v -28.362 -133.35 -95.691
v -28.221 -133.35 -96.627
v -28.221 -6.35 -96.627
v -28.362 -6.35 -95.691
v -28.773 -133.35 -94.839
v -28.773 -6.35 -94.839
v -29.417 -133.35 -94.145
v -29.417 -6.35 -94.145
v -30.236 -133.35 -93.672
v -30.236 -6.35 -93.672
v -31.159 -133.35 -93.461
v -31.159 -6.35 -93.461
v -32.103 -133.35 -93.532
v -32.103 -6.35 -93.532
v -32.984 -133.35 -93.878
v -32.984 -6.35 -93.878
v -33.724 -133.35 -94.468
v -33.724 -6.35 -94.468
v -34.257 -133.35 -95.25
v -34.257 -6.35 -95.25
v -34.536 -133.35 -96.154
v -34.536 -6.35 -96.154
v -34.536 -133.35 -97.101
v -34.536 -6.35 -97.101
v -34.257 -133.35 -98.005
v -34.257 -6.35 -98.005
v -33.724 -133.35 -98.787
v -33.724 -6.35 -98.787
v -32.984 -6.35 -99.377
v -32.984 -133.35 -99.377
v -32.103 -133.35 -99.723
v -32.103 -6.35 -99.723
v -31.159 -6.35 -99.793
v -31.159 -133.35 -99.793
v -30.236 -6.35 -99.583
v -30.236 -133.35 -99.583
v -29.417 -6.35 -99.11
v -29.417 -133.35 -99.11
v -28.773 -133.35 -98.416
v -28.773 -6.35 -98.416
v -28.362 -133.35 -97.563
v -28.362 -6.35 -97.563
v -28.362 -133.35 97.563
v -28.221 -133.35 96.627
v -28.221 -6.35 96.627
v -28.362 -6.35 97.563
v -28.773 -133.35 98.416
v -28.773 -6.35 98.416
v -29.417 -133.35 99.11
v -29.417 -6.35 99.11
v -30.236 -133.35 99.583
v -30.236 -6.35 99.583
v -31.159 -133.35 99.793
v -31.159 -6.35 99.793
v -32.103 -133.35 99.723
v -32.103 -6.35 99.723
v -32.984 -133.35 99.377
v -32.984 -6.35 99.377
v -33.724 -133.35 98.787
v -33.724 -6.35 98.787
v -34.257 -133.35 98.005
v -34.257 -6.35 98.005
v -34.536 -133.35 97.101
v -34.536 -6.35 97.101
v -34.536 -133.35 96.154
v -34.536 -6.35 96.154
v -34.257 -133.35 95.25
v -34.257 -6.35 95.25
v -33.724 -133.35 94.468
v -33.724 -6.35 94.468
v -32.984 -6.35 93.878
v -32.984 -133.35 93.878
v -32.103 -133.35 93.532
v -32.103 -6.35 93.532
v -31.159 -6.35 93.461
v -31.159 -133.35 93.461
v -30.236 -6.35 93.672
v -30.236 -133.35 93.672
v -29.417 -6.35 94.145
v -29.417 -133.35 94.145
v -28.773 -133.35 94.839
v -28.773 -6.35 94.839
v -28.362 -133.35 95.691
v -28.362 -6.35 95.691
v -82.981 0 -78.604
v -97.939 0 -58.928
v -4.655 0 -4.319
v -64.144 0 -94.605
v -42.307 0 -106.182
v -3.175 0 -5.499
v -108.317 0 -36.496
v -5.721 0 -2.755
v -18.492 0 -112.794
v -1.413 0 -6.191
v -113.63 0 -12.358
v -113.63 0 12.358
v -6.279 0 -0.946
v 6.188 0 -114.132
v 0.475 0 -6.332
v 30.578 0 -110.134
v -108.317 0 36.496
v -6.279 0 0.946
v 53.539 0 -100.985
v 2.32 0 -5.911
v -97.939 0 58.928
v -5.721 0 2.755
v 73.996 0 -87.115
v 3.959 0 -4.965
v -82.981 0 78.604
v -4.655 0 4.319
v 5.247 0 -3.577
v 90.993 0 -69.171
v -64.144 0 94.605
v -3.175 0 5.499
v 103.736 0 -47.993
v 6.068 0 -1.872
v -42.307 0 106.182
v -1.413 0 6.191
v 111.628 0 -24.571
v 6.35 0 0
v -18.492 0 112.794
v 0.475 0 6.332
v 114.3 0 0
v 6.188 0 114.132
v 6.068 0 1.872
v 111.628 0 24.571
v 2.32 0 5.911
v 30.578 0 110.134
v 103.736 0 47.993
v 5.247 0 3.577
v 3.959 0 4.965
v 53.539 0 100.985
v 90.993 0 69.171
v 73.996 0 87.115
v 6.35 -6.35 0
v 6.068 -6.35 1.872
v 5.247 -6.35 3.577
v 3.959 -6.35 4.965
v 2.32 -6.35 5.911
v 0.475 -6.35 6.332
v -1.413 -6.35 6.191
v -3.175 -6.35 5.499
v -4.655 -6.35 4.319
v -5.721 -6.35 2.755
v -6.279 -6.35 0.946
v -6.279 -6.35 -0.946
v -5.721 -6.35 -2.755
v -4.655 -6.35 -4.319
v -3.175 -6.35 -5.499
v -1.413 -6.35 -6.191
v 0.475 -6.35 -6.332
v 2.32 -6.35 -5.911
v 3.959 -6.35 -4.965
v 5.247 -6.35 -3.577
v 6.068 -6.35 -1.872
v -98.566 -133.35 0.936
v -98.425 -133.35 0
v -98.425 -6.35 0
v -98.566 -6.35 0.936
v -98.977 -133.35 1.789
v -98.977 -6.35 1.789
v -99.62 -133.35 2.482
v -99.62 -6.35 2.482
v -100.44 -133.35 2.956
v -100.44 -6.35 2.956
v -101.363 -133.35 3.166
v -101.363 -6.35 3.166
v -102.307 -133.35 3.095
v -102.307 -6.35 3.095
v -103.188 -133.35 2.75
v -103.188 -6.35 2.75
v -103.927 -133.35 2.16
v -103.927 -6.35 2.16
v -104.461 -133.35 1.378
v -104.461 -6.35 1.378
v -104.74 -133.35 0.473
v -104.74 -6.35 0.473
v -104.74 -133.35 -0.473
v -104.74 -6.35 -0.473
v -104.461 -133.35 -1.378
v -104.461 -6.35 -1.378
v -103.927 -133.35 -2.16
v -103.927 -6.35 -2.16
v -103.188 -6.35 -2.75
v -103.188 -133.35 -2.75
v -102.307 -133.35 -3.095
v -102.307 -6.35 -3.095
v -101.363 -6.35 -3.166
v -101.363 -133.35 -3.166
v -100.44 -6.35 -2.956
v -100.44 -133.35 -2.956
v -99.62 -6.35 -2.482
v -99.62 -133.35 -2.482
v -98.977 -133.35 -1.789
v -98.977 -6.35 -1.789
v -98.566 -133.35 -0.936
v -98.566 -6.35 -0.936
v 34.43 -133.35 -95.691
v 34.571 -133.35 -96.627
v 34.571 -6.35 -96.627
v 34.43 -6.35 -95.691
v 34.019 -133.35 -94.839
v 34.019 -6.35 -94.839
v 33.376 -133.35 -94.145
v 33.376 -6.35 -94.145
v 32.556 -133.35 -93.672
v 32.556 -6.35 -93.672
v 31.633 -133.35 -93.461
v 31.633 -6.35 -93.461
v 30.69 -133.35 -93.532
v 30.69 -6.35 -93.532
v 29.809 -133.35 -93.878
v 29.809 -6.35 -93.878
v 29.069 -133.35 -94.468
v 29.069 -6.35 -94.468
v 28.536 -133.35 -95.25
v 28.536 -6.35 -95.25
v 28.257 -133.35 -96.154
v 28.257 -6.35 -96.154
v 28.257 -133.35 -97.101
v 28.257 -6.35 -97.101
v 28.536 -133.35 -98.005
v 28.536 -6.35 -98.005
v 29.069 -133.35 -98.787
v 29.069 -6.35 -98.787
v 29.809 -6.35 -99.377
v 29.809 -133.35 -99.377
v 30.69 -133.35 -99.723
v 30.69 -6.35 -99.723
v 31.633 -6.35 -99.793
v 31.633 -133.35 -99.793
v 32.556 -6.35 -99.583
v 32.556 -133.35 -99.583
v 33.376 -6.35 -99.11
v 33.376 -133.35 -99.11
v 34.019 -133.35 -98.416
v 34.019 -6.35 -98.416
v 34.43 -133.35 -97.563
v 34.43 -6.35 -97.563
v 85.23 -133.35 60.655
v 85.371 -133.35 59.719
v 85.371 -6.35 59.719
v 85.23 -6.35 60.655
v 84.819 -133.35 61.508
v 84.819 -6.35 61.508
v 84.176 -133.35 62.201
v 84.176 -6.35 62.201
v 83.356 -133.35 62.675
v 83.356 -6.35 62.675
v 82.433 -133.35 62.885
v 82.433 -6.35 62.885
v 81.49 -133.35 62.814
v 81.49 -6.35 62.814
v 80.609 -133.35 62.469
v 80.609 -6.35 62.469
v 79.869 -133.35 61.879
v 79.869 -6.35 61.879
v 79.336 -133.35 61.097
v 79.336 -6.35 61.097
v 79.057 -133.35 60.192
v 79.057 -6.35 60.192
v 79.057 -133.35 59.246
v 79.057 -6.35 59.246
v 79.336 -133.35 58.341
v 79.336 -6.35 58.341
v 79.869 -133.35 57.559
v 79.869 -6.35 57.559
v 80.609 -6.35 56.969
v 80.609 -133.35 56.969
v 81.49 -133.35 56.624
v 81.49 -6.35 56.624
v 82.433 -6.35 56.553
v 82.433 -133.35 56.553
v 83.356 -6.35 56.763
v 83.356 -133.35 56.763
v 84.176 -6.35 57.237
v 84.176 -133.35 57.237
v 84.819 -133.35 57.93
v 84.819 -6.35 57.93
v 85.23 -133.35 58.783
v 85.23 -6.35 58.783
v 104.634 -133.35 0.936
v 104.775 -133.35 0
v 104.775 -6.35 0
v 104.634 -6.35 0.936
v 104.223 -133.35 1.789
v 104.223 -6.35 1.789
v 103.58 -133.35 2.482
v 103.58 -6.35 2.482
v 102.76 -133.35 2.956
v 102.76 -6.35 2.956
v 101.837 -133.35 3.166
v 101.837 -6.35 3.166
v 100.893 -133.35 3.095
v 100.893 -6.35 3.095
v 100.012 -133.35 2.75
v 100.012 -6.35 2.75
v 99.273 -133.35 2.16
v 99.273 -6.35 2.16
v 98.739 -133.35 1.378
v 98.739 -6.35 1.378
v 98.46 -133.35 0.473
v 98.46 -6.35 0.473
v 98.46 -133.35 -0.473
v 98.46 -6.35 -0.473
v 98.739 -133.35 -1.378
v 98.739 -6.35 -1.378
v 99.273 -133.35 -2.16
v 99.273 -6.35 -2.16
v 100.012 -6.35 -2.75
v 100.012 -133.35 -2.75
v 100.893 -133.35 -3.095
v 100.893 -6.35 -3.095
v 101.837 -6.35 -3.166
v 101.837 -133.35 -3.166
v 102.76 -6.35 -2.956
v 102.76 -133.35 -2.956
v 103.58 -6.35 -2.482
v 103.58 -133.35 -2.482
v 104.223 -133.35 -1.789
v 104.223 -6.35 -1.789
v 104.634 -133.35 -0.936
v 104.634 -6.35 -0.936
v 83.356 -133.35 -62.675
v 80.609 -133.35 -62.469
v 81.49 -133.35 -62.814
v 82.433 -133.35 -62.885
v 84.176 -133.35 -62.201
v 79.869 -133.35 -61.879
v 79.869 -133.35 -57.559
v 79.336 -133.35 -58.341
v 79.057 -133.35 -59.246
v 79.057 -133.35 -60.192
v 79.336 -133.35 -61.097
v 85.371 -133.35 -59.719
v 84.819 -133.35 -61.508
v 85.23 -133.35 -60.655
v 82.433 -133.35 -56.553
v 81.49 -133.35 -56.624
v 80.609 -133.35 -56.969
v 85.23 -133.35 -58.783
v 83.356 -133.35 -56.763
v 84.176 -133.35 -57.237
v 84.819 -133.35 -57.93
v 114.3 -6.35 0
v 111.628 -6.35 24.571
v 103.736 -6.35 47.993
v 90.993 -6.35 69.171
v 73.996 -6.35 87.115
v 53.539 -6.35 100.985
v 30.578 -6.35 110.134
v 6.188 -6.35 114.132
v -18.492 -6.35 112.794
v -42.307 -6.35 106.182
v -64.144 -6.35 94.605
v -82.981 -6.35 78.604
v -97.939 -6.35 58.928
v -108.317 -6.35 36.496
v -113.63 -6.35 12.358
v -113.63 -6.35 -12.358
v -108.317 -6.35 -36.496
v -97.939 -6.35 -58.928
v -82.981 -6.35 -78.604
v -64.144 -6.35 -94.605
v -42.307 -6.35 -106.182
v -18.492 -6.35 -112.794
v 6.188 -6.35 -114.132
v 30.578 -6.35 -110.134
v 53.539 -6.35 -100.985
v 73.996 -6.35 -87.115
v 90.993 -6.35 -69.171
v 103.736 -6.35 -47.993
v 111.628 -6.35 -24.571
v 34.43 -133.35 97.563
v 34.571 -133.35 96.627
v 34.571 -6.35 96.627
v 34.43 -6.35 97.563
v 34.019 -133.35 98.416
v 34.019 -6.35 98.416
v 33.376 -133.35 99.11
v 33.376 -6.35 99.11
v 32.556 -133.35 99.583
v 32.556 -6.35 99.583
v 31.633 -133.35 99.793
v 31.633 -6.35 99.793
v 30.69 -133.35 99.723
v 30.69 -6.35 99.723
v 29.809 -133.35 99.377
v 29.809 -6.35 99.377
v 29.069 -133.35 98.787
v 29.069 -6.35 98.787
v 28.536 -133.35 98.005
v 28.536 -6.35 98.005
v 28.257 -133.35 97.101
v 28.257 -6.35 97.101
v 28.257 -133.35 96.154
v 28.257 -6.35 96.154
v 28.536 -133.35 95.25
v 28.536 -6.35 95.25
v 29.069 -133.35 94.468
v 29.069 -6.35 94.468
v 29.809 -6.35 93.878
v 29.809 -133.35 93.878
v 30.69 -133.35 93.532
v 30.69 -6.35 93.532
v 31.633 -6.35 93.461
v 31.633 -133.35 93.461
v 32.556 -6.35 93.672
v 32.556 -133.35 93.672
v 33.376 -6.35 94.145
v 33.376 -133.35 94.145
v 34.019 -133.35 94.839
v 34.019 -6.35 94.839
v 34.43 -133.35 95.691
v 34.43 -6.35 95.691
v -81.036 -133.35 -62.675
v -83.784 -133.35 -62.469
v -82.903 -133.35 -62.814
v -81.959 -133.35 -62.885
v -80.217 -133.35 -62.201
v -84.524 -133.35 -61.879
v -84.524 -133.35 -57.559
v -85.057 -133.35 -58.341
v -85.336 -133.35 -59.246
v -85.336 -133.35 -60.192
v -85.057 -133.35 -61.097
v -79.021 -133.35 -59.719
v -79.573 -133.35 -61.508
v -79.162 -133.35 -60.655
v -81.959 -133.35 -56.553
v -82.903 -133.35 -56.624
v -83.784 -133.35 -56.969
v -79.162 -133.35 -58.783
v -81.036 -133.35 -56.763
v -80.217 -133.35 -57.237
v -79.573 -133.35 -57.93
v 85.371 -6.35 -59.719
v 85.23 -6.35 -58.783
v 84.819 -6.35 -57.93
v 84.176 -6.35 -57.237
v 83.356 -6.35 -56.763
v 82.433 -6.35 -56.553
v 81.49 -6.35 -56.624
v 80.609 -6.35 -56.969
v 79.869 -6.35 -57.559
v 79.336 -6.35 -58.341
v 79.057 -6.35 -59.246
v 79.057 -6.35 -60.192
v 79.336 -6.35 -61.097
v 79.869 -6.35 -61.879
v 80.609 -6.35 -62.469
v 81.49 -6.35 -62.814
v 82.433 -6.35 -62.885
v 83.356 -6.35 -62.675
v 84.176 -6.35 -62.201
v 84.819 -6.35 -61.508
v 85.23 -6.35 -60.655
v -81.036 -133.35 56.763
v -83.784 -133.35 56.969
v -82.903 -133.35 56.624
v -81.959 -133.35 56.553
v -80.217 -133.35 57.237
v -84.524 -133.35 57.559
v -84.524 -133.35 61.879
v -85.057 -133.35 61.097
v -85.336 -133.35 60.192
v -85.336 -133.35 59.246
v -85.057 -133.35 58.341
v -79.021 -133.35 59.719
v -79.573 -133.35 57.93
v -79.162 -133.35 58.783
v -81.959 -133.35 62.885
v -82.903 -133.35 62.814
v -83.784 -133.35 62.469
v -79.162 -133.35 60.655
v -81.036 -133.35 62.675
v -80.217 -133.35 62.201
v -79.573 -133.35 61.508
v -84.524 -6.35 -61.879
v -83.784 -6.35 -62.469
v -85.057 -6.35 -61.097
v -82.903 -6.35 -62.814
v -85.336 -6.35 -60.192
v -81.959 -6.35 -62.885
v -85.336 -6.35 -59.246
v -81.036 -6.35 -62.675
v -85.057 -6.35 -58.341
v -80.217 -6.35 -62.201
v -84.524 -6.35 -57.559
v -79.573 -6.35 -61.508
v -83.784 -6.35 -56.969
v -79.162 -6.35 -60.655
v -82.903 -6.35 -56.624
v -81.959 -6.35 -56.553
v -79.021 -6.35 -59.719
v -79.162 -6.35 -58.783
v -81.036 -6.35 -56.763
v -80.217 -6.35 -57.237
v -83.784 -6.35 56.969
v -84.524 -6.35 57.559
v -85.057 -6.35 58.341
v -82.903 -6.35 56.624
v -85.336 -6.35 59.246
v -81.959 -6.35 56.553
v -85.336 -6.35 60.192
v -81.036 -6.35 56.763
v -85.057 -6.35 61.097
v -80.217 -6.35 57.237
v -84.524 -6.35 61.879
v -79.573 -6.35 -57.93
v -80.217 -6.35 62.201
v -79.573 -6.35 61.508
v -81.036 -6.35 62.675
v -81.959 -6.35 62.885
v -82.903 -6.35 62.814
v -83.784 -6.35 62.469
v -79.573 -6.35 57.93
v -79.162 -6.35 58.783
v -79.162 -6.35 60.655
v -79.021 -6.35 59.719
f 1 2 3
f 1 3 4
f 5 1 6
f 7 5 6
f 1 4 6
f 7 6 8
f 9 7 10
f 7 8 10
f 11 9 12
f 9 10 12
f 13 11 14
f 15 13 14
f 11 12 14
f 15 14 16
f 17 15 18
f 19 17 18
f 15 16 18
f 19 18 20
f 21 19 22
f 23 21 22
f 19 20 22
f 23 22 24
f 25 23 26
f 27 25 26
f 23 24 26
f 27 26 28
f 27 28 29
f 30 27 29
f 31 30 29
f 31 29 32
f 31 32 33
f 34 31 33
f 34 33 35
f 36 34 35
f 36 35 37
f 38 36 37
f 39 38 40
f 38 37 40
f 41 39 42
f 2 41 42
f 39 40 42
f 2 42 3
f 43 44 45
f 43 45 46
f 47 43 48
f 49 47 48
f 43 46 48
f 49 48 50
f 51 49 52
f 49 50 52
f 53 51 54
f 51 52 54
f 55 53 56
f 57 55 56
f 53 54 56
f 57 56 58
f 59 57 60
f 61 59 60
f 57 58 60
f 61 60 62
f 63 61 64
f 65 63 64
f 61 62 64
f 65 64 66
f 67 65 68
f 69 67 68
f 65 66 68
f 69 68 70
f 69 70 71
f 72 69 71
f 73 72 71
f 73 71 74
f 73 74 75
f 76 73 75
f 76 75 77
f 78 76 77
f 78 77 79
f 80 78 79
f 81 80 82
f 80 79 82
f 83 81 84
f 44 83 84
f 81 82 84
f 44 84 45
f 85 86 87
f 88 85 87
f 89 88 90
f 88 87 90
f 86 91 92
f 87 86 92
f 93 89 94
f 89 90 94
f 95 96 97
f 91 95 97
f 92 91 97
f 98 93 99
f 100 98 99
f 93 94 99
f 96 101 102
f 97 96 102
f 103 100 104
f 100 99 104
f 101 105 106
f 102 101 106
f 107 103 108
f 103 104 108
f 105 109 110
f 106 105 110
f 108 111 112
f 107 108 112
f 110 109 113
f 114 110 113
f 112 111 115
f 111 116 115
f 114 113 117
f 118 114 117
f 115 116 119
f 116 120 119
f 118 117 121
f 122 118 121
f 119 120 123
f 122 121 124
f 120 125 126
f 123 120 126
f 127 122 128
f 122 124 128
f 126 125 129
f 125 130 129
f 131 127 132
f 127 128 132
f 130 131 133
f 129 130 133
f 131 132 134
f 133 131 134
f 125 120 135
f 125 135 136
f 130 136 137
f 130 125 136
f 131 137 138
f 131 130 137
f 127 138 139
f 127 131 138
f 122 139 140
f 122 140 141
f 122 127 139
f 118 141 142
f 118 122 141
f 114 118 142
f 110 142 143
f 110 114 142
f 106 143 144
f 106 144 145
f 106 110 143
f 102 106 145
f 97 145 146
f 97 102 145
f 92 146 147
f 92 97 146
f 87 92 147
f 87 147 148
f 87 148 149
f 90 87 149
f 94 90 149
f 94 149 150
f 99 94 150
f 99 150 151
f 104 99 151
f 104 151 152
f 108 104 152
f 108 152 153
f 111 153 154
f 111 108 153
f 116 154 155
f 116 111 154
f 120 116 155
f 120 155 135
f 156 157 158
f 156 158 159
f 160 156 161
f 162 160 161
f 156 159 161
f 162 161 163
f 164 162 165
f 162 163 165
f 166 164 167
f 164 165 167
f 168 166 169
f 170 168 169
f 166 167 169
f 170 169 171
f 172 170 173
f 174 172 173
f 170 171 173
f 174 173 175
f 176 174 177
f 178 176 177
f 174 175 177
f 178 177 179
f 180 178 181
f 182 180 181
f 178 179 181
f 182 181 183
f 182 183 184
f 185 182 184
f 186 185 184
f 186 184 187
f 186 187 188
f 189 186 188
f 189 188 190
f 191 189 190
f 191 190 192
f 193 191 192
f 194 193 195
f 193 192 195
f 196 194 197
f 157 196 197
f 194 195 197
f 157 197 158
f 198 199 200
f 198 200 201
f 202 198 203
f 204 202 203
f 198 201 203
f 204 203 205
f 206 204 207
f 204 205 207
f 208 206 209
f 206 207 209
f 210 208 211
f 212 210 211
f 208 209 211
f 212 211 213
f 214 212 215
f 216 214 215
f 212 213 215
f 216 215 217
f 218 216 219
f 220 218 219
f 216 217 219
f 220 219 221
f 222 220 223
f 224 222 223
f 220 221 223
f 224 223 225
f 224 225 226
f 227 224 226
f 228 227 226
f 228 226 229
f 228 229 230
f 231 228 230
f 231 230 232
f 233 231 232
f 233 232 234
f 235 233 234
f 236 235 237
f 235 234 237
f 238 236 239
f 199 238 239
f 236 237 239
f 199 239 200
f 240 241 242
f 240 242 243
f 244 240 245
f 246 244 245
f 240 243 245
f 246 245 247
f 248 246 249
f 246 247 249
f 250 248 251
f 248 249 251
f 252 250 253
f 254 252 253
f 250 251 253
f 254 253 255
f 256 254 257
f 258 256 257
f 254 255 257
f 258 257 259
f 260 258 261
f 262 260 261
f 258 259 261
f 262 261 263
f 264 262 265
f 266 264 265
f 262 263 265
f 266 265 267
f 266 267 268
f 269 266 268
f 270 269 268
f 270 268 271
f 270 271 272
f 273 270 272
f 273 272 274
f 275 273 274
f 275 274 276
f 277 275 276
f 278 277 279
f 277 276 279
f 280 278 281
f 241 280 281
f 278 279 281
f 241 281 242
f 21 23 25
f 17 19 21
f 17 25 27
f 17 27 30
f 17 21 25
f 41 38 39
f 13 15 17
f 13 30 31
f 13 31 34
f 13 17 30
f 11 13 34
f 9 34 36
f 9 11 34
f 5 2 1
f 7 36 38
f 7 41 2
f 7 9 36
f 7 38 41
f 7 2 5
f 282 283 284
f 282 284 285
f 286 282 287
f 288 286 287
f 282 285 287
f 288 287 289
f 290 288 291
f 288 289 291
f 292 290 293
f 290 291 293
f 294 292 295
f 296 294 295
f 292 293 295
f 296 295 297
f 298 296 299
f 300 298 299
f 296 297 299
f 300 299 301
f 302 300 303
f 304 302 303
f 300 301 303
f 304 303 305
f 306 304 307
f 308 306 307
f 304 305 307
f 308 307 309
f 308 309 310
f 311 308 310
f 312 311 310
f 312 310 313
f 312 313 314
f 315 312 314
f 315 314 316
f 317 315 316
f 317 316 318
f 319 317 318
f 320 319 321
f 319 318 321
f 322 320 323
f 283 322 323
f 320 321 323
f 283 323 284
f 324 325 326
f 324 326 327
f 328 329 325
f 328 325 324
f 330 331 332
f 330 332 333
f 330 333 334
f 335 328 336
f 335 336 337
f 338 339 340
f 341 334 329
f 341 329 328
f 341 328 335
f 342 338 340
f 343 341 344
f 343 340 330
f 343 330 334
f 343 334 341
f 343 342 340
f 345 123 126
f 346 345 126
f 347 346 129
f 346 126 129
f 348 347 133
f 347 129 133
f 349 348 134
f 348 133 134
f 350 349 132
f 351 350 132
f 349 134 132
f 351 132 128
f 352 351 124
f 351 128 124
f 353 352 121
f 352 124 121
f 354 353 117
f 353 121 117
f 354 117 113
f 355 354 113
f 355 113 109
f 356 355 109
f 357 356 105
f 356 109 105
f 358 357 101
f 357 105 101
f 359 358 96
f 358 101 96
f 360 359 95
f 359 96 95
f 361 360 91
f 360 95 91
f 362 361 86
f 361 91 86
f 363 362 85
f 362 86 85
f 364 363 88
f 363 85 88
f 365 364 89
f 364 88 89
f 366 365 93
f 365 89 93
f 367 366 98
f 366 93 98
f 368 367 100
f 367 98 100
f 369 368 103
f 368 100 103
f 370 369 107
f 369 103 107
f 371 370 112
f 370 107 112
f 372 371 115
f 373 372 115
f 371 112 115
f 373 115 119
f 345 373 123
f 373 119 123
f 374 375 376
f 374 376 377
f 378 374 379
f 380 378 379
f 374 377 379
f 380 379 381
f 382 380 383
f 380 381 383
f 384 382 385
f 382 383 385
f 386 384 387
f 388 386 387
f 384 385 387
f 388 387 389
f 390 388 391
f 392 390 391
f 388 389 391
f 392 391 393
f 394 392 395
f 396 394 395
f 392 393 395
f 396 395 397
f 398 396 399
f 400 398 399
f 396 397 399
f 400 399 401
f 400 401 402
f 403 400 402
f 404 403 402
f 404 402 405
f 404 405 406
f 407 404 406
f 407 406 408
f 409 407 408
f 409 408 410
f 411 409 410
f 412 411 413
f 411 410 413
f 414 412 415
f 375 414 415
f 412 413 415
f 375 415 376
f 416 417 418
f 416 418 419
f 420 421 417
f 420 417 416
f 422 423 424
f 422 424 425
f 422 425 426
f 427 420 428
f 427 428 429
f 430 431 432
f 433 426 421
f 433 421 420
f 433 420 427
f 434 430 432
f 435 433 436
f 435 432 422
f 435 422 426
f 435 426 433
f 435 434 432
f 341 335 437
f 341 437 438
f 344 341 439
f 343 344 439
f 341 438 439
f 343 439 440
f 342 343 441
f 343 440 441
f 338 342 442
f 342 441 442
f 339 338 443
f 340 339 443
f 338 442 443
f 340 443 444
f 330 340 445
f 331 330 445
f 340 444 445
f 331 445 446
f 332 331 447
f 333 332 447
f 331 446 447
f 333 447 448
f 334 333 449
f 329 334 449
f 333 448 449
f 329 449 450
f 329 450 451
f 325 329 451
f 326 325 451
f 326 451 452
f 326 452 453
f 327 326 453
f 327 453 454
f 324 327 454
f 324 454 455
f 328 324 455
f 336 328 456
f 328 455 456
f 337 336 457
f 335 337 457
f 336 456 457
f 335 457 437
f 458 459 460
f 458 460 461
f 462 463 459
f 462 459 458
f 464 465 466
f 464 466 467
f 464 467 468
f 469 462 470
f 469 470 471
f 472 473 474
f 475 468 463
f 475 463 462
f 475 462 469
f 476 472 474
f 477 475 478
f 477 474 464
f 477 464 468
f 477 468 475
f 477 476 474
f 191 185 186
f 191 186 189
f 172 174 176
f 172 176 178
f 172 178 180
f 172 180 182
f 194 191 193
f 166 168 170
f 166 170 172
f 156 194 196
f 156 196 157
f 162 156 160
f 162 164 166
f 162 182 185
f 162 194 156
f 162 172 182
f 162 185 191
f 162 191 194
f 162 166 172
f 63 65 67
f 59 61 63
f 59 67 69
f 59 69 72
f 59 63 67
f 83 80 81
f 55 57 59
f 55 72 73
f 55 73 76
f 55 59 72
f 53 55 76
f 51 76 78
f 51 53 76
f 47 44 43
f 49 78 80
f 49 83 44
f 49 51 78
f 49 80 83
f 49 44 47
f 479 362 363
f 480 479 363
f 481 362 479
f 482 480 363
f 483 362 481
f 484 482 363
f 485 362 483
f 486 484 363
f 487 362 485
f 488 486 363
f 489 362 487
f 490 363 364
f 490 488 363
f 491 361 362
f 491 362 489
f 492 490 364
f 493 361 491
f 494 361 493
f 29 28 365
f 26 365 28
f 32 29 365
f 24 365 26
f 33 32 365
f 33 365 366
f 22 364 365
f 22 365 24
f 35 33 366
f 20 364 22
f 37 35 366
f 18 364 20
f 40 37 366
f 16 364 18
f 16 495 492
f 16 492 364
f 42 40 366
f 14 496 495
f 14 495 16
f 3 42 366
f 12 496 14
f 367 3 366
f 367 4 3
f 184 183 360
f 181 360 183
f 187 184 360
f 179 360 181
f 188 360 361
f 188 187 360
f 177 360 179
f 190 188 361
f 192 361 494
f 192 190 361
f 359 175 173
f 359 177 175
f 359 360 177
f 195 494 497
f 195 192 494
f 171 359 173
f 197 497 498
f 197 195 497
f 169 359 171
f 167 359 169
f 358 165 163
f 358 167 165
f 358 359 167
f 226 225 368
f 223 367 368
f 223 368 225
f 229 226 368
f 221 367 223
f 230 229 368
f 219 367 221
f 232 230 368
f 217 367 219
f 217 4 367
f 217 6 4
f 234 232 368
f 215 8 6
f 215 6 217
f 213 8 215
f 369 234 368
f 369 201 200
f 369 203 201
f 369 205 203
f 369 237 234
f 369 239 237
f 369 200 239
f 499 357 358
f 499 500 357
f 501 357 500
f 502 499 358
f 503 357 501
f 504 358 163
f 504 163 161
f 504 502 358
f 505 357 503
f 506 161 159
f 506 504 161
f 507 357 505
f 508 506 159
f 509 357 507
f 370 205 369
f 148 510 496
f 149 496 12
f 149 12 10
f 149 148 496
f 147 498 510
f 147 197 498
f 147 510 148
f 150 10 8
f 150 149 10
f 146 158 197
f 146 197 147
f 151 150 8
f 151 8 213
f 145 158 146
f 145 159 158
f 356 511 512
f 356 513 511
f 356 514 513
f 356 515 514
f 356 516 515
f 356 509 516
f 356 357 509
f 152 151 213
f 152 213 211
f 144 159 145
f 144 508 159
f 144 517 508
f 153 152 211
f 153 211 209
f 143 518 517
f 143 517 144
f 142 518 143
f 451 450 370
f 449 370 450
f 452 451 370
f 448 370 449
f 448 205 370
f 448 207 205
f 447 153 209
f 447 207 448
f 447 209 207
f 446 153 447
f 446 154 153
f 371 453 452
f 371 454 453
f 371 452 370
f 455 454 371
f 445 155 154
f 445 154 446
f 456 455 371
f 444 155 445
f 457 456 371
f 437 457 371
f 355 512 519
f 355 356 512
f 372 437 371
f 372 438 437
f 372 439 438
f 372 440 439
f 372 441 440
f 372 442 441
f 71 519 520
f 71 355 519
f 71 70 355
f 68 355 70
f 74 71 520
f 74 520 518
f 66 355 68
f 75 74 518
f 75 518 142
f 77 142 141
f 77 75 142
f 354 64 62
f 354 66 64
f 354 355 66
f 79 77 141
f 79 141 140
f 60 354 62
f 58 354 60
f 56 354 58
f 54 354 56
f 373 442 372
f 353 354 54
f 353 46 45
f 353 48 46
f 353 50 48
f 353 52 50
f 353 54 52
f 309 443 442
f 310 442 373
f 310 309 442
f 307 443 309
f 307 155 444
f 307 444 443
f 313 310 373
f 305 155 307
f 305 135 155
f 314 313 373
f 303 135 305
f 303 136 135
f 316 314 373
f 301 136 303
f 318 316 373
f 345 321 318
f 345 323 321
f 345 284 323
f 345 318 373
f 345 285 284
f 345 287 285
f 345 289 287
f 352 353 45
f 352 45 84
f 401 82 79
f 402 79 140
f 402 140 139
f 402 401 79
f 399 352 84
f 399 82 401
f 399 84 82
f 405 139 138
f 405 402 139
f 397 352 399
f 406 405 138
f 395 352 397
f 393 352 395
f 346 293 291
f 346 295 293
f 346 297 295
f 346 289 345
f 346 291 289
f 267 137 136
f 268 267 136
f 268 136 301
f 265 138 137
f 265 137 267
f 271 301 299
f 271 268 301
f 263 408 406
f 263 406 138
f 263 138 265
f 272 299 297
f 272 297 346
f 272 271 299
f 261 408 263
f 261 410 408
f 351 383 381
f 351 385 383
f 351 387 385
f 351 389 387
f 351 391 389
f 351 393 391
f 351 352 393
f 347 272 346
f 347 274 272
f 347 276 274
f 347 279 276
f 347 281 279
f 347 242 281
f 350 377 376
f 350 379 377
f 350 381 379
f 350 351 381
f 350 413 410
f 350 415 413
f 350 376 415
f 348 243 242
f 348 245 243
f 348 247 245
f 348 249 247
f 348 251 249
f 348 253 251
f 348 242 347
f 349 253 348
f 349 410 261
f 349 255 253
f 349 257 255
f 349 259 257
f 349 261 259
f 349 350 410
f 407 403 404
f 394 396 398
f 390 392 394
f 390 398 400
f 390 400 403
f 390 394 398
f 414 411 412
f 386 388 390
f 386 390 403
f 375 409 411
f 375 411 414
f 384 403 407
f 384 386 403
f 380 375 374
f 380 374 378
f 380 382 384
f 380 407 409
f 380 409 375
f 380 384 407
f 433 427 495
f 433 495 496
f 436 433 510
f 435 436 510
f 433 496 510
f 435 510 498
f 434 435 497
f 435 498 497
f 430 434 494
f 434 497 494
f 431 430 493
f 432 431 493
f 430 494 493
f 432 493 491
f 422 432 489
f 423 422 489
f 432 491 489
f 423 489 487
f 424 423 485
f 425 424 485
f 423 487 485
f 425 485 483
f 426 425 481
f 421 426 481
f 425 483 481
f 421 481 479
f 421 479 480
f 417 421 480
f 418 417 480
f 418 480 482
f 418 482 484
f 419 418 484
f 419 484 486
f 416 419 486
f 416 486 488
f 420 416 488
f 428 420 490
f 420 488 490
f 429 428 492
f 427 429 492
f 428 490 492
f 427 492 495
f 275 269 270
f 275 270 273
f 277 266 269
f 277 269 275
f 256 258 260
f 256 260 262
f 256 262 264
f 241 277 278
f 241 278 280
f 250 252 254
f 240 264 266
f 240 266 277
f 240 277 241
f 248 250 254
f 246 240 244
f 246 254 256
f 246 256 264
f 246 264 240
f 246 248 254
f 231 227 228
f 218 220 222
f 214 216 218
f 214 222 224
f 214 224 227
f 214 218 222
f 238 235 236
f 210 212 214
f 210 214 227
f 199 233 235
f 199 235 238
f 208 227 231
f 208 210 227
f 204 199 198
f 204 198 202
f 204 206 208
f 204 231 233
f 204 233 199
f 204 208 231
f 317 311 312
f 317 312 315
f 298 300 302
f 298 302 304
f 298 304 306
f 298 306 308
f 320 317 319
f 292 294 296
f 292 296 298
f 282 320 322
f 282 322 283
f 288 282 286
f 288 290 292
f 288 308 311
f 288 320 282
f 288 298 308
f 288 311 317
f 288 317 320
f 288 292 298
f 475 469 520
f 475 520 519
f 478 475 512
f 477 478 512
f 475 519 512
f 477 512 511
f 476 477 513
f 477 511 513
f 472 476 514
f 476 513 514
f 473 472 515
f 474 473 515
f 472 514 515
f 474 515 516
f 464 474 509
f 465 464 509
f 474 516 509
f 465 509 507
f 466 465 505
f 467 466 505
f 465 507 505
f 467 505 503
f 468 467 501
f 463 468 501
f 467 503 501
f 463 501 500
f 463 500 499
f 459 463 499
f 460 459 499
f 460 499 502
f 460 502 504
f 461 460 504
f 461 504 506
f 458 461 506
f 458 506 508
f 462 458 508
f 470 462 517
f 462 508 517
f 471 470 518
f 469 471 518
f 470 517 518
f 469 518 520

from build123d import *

# Parameters (mm, degrees)
F0_R     = 114.3
F0_R_2   = 6.35
F1_DEPTH = 6.35
F2_R     = 3.175
F3_DEPTH = 127


with BuildPart() as f1:
    # F0 (on Front) → F1 (new body)
    with BuildSketch(Plane.XZ):
        Circle(F0_R)
        Circle(F0_R_2, mode=Mode.SUBTRACT)
    extrude(amount=F1_DEPTH)

    # F2 (on face) → F3 (join)
    with BuildSketch(Plane.XZ.offset(6.35)):
        with Locations((101.6, 0)):
            Circle(F2_R)
        with Locations((82.196127, 59.718982)):
            Circle(F2_R)
        with Locations((31.396127, 96.627342)):
            Circle(F2_R)
        with Locations((-31.396127, 96.627342)):
            Circle(F2_R)
        with Locations((-82.196127, 59.718982)):
            Circle(F2_R)
        with Locations((-101.6, 0)):
            Circle(F2_R)
        with Locations((-82.196127, -59.718982)):
            Circle(F2_R)
        with Locations((-31.396127, -96.627342)):
            Circle(F2_R)
        with Locations((31.396127, -96.627342)):
            Circle(F2_R)
        with Locations((82.196127, -59.718982)):
            Circle(F2_R)
    extrude(amount=F3_DEPTH)


solid = f1.part
